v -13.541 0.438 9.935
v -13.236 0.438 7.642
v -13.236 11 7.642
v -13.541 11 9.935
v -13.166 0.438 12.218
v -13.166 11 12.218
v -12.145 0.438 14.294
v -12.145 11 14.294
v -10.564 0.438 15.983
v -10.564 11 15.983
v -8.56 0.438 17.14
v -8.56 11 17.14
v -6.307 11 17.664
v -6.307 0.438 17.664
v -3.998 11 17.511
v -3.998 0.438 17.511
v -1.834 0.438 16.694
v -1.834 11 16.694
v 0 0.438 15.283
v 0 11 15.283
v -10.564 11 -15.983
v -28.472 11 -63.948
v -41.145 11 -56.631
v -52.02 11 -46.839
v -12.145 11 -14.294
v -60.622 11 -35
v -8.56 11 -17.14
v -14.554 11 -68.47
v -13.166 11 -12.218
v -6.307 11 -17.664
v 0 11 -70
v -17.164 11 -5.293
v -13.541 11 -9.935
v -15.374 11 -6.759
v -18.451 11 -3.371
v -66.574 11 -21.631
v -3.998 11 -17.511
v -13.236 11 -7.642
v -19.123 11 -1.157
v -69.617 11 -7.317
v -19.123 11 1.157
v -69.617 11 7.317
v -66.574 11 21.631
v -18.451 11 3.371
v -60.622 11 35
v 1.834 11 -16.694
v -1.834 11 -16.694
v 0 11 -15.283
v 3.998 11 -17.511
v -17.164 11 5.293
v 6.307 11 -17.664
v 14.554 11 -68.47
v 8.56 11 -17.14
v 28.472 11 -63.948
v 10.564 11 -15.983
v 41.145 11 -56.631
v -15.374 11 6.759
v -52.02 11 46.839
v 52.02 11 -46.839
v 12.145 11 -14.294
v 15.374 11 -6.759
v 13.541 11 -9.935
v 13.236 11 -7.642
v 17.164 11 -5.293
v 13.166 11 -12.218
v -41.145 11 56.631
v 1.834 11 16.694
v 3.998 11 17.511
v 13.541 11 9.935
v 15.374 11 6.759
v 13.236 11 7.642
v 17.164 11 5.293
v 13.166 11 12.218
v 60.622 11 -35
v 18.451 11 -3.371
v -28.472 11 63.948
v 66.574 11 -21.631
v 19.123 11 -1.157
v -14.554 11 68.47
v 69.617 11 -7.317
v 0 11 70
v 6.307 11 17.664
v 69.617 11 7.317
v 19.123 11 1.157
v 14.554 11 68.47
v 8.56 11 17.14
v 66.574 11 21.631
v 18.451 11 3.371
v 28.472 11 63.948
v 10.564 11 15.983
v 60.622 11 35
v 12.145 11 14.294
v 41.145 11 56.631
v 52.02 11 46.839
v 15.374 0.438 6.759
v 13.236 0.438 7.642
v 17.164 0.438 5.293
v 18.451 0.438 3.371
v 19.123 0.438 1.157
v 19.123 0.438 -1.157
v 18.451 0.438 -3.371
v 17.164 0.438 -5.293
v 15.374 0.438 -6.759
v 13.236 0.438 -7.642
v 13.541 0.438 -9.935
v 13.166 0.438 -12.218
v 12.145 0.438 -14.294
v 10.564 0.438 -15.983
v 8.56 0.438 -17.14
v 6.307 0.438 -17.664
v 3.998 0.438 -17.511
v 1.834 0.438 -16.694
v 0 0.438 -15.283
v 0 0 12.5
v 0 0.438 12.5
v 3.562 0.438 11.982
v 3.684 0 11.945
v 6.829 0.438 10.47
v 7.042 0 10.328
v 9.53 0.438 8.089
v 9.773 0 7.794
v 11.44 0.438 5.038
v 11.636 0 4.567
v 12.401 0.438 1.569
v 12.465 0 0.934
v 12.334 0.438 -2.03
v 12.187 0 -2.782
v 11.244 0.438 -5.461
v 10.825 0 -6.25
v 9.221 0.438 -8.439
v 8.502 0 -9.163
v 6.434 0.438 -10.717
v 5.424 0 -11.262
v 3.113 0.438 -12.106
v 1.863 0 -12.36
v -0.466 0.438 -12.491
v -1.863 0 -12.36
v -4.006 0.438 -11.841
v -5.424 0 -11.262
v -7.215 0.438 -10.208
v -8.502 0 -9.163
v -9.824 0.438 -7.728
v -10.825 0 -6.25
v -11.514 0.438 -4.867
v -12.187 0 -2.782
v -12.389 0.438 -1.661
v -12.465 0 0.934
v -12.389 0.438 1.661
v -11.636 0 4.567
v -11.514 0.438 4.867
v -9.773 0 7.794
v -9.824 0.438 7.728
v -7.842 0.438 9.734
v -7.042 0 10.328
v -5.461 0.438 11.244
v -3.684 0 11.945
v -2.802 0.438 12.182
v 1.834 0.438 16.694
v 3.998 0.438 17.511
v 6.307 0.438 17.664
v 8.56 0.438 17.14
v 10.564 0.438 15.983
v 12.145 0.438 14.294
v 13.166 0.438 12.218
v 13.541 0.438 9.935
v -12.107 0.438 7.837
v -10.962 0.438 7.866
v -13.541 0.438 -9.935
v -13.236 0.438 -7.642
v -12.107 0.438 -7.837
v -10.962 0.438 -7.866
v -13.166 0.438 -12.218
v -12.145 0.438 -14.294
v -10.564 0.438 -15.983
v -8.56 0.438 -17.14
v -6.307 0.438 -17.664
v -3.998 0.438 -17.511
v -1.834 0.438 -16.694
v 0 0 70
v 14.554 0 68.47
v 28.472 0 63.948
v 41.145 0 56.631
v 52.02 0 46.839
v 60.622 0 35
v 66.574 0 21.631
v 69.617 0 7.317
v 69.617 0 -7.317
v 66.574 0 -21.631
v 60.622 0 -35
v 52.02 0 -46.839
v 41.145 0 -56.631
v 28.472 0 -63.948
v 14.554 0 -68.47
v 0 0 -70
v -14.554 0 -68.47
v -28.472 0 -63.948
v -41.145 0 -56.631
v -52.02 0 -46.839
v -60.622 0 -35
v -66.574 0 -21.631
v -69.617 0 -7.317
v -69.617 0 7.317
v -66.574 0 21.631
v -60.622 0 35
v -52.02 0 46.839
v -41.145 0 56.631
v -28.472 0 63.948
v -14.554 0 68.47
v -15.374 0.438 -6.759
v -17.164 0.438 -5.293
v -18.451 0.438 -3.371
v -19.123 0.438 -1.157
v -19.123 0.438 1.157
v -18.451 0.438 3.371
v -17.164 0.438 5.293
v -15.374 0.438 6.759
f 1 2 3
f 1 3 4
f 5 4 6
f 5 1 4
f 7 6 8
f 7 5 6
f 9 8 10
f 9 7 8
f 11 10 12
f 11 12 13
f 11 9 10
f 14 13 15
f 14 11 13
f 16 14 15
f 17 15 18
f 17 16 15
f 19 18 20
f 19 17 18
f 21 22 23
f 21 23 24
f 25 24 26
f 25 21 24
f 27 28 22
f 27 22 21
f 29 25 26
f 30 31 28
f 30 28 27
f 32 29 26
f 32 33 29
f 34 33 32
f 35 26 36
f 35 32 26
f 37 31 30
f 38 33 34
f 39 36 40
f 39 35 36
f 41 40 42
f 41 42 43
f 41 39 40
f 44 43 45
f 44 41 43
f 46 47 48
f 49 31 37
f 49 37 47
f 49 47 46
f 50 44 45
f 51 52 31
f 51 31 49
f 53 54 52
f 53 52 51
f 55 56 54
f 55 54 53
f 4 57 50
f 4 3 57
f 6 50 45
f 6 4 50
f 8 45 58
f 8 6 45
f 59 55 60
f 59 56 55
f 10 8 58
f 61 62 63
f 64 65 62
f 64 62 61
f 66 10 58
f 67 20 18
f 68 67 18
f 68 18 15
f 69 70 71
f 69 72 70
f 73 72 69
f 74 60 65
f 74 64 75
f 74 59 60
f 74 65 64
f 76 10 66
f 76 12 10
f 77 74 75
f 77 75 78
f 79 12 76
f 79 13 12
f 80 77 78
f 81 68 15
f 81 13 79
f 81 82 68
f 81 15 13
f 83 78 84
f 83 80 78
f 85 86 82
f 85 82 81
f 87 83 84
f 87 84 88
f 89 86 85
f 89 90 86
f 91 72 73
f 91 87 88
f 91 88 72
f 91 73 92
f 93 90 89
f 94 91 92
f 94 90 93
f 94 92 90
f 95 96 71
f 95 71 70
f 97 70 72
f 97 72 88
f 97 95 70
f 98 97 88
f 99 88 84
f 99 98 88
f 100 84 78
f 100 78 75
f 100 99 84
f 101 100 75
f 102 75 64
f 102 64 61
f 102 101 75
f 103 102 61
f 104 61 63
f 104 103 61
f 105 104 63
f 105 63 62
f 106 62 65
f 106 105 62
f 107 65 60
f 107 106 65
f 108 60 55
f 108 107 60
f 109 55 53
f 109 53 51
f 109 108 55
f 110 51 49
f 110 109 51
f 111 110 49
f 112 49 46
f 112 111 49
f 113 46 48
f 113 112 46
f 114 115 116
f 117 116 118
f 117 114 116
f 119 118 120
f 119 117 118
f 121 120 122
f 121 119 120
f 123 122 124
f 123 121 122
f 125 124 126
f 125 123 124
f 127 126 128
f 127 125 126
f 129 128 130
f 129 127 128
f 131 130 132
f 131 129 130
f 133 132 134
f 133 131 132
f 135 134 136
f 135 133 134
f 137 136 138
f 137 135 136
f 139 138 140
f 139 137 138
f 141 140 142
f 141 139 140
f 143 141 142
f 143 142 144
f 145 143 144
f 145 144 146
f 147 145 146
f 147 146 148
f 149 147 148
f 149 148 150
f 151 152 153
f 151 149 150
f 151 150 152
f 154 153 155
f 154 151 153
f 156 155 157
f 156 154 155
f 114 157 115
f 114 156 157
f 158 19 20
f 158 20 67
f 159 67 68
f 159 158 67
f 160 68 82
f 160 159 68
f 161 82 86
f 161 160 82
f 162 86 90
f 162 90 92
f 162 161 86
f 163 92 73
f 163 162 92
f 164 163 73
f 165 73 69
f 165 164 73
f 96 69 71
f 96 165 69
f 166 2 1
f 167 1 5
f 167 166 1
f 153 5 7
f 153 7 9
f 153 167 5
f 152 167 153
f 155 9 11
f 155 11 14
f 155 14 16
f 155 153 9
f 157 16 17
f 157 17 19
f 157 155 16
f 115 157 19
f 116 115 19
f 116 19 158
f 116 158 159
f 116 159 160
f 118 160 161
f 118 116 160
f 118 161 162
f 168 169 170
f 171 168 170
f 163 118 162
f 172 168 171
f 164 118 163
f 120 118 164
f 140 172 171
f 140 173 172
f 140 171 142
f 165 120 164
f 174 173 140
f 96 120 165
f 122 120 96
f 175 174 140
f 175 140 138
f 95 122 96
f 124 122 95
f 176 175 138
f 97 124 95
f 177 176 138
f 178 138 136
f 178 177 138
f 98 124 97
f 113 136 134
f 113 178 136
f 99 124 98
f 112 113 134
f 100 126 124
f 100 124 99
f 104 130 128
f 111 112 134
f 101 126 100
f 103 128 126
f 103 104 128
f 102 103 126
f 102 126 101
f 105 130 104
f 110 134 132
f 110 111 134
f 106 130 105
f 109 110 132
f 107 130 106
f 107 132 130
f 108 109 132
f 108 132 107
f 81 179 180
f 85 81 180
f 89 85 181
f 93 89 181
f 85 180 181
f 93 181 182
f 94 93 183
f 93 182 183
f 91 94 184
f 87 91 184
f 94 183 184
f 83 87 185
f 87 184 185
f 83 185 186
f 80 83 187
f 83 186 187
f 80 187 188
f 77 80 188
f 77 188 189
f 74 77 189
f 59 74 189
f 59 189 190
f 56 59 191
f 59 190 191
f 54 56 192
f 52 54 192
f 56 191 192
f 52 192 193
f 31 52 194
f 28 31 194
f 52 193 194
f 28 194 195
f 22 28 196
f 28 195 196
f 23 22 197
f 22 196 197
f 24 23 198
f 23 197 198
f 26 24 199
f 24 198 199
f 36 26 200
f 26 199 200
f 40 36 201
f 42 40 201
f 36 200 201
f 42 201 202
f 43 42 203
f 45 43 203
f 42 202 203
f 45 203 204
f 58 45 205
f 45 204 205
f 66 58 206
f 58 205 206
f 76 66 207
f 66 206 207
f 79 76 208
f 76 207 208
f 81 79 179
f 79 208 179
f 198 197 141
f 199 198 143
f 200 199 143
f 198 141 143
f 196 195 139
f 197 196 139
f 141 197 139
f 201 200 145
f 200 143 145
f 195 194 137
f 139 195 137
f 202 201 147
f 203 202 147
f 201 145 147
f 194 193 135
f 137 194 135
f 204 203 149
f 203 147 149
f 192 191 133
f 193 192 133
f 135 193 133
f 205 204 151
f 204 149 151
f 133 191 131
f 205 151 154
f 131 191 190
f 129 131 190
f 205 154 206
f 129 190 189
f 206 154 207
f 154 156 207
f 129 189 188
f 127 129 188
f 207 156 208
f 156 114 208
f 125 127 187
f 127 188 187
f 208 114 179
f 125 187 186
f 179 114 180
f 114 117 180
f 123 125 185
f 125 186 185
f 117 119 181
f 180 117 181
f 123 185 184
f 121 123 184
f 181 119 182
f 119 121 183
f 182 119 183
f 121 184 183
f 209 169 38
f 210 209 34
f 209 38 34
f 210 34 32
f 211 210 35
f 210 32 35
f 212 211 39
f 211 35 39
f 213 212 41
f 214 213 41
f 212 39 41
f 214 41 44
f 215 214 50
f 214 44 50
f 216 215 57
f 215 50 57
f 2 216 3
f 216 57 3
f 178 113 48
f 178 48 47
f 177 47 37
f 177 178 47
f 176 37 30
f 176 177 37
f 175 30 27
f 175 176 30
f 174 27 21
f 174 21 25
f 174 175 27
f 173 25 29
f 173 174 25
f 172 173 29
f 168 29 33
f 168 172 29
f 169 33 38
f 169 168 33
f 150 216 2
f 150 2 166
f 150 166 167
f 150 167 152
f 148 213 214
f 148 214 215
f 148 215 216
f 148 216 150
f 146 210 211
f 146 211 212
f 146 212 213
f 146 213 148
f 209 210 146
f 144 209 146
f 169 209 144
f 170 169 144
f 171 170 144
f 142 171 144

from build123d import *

# Parameters (mm, degrees)
SKETCH1_R           = 70
BOSS_EXTRUDE1_DEPTH = 11
SKETCH2_R           = 12.5
CUT_EXTRUDE1_DEPTH  = 100.604216778
SKETCH3_R           = 7.874590161
CUT_EXTRUDE2_DEPTH  = 10.562321237
CIRPATTERN1_COUNT   = 6


with BuildPart() as part:
    # Sketch1 → Boss-Extrude1 (new body)
    with BuildSketch(Plane(origin=(0, 0, 0), x_dir=(1, 0, 0), z_dir=(0, 1, 0))):
        Circle(SKETCH1_R)
    extrude(amount=BOSS_EXTRUDE1_DEPTH)

    # Sketch2 → Cut-Extrude1 (cut, through all)
    with BuildSketch(Plane(origin=(0, 0, 0), x_dir=(1, 0, 0), z_dir=(0, 1, 0))):
        Circle(SKETCH2_R)
    extrude(amount=CUT_EXTRUDE1_DEPTH, mode=Mode.SUBTRACT)

    # Sketch3 → Cut-Extrude2 (cut)
    with BuildSketch(Plane(origin=(0, 11, 0), x_dir=(1, 0, 0), z_dir=(0, 1, 0))):
        with Locations((-11.334309292, 0)):
            Circle(SKETCH3_R)
    cut_extrude2 = extrude(amount=-CUT_EXTRUDE2_DEPTH, mode=Mode.SUBTRACT)

    # CirPattern1: Cut-Extrude2 ×6 about axis
    cirpattern1_axis = Axis((0, 0, 0), (0, 1, 0))
    for i in range(1, CIRPATTERN1_COUNT):
        add(cut_extrude2.rotate(cirpattern1_axis, i * 360 / CIRPATTERN1_COUNT), mode=Mode.SUBTRACT)


solid = part.part
